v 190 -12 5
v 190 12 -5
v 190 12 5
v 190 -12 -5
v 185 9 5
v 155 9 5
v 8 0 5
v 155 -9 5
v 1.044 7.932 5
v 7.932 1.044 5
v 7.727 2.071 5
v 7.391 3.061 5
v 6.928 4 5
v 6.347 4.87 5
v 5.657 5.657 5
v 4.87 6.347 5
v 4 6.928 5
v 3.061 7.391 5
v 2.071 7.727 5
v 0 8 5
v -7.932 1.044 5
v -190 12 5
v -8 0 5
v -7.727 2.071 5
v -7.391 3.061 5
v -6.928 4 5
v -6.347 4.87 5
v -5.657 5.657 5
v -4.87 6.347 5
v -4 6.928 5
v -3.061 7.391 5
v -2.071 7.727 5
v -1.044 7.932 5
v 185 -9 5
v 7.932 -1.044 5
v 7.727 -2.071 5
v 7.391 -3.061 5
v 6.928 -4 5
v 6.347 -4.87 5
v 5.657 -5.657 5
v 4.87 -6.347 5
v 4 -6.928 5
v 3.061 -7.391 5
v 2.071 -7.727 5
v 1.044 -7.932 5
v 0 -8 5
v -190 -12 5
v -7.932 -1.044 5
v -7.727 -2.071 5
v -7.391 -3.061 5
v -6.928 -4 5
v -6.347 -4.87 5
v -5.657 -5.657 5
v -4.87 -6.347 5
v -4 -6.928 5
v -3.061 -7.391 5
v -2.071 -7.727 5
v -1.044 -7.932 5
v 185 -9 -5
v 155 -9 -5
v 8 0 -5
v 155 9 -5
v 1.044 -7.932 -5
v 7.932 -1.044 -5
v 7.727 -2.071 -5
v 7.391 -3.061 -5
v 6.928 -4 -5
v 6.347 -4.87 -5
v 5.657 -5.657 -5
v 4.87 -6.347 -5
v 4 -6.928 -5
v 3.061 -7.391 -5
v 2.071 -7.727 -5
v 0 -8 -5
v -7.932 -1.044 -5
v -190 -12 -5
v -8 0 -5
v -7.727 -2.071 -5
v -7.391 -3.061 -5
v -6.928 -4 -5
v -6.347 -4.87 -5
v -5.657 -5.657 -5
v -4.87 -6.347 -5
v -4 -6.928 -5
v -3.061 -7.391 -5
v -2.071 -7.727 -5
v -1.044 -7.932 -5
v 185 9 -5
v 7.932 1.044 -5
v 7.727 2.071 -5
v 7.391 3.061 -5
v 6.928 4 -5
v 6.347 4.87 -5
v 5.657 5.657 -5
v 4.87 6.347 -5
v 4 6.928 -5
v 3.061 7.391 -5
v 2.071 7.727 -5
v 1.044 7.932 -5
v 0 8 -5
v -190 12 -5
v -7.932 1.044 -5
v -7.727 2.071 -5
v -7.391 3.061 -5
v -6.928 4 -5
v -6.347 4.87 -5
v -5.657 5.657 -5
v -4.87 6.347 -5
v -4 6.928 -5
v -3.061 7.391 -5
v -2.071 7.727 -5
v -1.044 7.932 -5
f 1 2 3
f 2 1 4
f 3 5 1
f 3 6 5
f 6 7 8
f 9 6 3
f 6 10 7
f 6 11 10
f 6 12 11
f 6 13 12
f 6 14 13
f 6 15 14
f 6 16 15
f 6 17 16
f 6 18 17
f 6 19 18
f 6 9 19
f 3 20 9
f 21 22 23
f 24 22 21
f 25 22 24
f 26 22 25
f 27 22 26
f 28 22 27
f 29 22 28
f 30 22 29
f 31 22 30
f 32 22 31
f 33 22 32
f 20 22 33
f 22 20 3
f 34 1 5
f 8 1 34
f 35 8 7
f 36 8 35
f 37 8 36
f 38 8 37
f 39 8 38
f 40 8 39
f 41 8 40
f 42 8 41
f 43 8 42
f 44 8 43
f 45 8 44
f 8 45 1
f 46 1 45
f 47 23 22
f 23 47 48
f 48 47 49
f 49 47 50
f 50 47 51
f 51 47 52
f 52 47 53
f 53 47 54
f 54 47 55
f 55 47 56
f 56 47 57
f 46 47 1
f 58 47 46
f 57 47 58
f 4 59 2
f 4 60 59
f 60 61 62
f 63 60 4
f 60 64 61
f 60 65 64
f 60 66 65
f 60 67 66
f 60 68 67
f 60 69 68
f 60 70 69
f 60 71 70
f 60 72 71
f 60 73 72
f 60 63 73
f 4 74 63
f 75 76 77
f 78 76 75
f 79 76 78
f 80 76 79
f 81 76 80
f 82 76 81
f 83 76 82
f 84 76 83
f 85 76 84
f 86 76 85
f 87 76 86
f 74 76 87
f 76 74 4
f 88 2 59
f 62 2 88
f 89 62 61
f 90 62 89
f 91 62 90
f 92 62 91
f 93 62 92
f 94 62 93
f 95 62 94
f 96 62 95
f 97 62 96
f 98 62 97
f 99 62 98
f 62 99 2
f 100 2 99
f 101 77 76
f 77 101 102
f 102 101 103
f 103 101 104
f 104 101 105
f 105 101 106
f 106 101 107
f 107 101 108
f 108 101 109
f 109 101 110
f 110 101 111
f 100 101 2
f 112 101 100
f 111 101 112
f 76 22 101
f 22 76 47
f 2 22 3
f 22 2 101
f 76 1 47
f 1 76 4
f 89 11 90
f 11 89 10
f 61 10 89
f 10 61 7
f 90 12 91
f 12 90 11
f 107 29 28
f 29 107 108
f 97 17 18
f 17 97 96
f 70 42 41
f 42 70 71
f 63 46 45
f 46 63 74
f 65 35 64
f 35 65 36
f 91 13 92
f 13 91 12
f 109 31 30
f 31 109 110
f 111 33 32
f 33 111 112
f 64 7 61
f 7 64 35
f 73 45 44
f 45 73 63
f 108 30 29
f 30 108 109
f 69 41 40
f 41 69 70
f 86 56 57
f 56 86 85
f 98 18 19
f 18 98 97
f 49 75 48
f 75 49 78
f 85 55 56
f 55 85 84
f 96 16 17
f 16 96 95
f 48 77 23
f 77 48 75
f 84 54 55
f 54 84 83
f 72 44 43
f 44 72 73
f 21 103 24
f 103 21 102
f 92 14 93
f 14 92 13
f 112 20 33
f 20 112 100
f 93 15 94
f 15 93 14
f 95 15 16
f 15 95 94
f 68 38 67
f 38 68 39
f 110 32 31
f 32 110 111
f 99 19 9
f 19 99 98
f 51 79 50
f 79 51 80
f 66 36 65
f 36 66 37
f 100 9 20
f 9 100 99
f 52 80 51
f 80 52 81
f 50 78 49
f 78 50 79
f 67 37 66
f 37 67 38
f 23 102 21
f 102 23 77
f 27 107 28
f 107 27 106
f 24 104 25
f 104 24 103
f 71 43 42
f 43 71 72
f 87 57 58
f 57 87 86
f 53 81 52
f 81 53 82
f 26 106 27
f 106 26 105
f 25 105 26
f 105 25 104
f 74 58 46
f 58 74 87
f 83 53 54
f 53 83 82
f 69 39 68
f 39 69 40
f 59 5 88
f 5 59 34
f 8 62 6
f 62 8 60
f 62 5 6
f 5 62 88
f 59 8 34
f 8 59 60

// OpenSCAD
arm_length=380;arm_width=24;arm_height=10;center_hole_r=8;
slot_x=155;slot_len=30;slot_w=18;
difference(){
  cube([arm_length,arm_width,arm_height],center=true);
  cylinder(h=arm_height+2,r=center_hole_r,center=true,$fn=48);
  translate([slot_x+slot_len/2-arm_length/2+190,0,0])
    cube([slot_len,slot_w,arm_height+2],center=true);
}
